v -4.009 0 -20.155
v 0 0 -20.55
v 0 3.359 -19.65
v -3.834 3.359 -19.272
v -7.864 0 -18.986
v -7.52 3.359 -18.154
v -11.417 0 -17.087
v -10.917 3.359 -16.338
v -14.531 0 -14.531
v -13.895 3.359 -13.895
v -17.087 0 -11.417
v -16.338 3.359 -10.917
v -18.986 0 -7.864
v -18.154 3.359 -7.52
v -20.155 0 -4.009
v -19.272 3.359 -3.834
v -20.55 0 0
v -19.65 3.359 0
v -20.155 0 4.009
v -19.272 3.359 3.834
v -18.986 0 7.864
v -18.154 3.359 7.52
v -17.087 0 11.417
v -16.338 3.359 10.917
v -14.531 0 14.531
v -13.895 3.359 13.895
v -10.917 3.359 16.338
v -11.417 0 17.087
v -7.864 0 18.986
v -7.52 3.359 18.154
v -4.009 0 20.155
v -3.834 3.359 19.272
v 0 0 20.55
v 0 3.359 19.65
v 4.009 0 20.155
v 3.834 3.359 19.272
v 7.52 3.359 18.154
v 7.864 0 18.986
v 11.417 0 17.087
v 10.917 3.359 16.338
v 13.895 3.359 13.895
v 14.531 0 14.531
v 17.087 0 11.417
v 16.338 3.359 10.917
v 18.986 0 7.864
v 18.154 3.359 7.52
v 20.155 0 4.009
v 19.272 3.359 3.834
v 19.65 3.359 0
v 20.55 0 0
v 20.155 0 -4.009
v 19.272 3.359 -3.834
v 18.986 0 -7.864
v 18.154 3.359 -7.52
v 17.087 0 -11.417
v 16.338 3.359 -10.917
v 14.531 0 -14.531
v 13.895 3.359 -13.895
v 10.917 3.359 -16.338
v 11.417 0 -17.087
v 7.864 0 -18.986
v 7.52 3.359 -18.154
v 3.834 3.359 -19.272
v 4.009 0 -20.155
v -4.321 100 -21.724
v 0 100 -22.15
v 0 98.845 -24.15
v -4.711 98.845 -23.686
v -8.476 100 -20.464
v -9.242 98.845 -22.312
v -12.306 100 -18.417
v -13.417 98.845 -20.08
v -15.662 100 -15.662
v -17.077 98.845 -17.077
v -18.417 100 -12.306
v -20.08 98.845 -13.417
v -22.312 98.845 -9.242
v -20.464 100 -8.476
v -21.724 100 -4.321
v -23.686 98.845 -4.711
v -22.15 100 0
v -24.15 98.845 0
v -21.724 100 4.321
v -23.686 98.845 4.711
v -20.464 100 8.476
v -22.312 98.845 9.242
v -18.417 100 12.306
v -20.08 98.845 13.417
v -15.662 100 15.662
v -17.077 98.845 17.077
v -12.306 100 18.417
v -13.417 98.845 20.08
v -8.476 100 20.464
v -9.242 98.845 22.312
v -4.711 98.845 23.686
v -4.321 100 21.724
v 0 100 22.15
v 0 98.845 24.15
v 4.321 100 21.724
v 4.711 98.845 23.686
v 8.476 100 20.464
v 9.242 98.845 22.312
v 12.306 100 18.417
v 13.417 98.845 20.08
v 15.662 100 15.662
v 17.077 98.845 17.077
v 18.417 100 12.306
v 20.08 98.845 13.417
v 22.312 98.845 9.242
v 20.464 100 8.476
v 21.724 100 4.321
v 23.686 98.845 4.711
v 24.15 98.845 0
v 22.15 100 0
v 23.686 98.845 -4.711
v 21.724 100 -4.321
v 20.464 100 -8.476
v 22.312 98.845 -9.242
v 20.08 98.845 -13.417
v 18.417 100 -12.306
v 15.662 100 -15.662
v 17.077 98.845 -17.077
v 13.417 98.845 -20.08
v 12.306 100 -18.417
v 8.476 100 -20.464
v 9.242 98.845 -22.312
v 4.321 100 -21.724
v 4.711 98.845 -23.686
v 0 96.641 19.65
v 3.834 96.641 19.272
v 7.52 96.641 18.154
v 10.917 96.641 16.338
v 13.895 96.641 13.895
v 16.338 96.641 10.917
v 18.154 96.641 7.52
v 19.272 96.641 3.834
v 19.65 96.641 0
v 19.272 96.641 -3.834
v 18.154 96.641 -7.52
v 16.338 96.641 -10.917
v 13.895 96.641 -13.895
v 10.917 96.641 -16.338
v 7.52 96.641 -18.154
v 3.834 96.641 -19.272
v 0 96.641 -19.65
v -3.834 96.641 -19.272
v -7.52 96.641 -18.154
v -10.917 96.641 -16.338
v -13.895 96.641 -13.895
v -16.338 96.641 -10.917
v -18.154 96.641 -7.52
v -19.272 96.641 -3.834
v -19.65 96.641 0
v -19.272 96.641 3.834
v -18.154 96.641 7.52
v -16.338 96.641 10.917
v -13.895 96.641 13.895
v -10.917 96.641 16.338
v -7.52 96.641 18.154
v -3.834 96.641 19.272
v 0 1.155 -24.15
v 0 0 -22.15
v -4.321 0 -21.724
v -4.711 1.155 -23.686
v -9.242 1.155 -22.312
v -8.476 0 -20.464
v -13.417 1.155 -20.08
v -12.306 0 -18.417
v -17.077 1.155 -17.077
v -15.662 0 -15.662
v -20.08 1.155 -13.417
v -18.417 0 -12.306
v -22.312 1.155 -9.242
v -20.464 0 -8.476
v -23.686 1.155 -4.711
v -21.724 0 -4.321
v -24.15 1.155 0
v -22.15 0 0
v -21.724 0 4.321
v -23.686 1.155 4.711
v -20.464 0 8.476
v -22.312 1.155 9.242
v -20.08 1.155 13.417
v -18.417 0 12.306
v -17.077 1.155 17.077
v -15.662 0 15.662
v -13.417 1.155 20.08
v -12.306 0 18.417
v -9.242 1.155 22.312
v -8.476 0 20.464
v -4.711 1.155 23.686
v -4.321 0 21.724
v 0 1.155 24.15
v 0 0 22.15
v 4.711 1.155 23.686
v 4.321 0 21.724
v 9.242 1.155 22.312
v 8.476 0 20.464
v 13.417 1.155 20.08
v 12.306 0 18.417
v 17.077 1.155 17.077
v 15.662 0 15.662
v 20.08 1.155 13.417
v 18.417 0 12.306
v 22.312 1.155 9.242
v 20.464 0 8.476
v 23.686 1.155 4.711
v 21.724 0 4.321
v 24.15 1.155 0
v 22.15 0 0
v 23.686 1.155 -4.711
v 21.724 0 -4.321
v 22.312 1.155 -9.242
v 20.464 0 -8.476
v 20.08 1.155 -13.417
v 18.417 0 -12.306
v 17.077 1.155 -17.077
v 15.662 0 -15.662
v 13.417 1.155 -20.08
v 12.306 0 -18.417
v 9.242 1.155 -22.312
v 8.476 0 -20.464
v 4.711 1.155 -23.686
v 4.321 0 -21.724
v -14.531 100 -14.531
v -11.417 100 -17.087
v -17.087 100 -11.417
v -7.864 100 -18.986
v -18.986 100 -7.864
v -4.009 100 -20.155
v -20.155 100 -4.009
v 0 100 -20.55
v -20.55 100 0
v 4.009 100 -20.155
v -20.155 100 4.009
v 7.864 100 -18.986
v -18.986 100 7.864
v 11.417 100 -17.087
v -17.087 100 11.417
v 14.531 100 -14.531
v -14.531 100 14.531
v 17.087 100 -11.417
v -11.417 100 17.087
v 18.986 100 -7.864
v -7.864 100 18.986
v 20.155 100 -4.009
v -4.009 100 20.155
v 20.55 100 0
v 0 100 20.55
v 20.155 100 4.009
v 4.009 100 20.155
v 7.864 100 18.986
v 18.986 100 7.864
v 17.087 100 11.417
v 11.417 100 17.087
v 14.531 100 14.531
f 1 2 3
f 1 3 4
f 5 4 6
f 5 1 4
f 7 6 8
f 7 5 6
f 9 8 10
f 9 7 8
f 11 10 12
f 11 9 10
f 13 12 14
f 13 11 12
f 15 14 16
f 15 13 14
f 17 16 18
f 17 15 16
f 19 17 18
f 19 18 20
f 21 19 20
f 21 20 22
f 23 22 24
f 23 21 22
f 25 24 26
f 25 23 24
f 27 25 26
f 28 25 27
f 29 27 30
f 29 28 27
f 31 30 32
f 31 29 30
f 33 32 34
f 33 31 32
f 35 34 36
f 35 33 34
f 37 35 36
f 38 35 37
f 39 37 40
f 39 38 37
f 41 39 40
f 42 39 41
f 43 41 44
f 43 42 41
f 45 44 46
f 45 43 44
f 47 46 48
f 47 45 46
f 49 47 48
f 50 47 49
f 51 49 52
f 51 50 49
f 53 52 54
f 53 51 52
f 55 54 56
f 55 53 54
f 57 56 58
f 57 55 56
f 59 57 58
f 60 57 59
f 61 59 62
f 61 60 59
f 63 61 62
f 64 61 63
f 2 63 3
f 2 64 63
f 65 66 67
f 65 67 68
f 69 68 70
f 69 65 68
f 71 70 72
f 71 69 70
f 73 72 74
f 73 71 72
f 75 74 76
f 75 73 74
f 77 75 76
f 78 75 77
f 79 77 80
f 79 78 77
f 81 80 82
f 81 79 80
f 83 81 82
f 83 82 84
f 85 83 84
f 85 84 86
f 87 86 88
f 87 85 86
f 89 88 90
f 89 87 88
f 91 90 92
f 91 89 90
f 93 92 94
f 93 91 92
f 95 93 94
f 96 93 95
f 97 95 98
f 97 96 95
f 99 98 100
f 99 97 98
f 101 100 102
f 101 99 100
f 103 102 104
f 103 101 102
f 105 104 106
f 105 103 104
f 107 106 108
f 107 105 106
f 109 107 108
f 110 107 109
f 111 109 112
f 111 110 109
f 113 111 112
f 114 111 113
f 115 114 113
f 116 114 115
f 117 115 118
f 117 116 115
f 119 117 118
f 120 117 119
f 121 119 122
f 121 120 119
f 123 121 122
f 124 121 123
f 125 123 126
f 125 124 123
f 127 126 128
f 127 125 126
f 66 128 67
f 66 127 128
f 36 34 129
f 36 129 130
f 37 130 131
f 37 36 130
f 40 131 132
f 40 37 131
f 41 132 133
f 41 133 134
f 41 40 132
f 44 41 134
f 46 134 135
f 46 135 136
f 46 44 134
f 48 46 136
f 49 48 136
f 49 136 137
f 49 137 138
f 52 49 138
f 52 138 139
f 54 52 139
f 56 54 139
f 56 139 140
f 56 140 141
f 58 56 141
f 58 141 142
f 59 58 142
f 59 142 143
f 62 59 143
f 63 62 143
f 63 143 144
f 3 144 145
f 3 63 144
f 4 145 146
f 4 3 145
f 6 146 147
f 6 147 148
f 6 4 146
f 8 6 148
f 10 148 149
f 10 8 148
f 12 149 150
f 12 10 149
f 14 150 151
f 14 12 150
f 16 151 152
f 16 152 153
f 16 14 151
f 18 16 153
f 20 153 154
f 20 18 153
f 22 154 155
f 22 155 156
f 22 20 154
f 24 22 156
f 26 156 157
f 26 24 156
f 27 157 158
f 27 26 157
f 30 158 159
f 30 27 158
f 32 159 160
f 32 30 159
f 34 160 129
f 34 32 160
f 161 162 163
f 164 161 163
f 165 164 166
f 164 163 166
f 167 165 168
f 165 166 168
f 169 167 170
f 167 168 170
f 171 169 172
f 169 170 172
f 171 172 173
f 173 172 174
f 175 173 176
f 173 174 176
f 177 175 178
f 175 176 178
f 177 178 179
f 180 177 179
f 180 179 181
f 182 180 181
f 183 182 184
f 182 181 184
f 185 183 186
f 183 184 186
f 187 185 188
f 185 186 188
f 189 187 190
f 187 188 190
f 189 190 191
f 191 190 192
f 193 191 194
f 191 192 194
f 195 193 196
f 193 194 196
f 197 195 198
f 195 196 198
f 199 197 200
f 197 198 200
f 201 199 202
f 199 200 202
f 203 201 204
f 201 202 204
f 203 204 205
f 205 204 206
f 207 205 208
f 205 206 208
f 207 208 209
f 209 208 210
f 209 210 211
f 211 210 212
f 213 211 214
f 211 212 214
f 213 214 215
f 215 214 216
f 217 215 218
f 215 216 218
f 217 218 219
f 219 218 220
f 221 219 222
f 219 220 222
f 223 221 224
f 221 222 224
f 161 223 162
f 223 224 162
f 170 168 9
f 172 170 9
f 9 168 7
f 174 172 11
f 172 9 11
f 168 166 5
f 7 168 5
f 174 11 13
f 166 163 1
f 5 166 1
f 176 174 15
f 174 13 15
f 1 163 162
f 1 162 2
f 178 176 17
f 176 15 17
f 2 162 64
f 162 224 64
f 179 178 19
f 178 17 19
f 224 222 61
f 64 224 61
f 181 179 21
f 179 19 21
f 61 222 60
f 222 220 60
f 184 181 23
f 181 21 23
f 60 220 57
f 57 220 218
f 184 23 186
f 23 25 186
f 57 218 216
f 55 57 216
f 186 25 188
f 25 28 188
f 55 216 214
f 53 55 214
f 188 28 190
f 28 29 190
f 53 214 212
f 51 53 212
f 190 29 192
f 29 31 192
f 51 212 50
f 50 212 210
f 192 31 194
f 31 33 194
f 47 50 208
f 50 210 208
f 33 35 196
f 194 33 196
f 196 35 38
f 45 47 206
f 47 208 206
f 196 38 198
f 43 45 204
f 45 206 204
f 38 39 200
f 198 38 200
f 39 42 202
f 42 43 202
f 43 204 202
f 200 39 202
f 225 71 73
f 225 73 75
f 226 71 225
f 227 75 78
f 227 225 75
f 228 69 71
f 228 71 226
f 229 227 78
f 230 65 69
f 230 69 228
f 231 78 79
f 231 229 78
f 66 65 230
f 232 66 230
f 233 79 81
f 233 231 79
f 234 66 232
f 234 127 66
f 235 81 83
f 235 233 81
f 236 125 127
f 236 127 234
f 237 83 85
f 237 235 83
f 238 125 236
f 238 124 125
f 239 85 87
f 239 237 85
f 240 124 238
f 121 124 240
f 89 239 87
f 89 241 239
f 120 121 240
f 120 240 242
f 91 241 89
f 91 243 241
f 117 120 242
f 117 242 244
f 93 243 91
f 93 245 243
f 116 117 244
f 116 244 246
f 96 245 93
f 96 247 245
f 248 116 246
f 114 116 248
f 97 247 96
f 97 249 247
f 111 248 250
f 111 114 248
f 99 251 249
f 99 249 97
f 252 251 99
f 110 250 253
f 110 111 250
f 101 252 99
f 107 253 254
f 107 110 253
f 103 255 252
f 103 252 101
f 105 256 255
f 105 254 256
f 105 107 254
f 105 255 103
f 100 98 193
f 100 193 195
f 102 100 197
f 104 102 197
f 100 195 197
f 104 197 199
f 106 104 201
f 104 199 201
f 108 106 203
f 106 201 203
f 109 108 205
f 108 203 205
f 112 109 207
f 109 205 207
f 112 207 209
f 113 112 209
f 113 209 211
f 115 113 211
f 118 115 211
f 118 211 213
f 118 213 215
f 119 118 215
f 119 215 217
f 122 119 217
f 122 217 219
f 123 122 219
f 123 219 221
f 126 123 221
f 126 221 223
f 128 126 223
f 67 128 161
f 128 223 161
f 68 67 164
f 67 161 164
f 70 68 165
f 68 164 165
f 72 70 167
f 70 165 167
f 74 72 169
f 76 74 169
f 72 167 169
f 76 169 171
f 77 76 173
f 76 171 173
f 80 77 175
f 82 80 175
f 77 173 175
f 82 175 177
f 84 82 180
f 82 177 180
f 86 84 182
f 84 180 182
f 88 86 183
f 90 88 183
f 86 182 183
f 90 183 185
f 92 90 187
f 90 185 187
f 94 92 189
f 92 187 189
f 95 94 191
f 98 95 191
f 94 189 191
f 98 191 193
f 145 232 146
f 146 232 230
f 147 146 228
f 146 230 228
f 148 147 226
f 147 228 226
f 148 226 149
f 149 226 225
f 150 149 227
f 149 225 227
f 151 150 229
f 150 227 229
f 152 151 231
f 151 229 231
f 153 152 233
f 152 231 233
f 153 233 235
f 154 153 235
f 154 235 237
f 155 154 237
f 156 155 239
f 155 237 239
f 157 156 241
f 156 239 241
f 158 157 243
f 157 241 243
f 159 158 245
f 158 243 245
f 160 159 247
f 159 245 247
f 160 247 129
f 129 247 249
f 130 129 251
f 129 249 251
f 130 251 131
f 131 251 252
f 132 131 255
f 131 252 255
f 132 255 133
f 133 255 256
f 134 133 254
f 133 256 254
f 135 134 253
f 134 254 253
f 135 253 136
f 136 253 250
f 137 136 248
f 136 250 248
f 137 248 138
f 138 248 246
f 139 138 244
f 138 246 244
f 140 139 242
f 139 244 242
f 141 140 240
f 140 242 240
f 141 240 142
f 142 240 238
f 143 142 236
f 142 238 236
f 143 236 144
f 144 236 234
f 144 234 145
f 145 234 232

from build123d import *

# Parameters (mm, degrees)
DURCHMESSER_WD_R   = 24.15
DURCHMESSER_WD_R_2 = 19.65
ROHR_DEPTH         = 100


with BuildPart() as part:
    # Durchmesser/ WD → Rohr (new body)
    with BuildSketch(Plane(origin=(0, 0, 0), x_dir=(1, 0, 0), z_dir=(0, 1, 0))):
        with Locations(Location((0, 0, 0), (0, 0, 270))):  # turned: the seam where the file's is
            Circle(DURCHMESSER_WD_R)
        with Locations(Location((0, 0, 0), (0, 0, 270))):  # turned: the seam where the file's is
            Circle(DURCHMESSER_WD_R_2, mode=Mode.SUBTRACT)
    extrude(amount=ROHR_DEPTH)

    # Fase1 → Schweißfase 1 (revolve, cut)
    with BuildSketch(Plane.XY, mode=Mode.PRIVATE) as schwei_fase_1_sk:
        Polygon((24.15, 100), (24.15, 98.845299462), (22.15, 100), align=None)
        Polygon((20.55, 100), (19.65, 100), (19.65, 96.641154273), align=None)
    revolve(schwei_fase_1_sk.sketch.rotate(Axis((0, 0, 0), (0, 1, 0)), 90), axis=Axis((0, 0, 0), (0, 1, 0)), mode=Mode.SUBTRACT)  # turned: the seam where the file's is

    # Fase2 → Schweißfase 2 (revolve, cut)
    with BuildSketch(Plane.XY, mode=Mode.PRIVATE) as schwei_fase_2_sk:
        Polygon((24.15, 0), (24.15, 1.154700538), (22.15, 0), align=None)
        Polygon((20.55, 0), (19.65, 0), (19.65, 3.358845727), align=None)
    revolve(schwei_fase_2_sk.sketch.rotate(Axis((0, 0, 0), (0, 1, 0)), 90), axis=Axis((0, 0, 0), (0, 1, 0)), mode=Mode.SUBTRACT)  # turned: the seam where the file's is


solid = part.part
